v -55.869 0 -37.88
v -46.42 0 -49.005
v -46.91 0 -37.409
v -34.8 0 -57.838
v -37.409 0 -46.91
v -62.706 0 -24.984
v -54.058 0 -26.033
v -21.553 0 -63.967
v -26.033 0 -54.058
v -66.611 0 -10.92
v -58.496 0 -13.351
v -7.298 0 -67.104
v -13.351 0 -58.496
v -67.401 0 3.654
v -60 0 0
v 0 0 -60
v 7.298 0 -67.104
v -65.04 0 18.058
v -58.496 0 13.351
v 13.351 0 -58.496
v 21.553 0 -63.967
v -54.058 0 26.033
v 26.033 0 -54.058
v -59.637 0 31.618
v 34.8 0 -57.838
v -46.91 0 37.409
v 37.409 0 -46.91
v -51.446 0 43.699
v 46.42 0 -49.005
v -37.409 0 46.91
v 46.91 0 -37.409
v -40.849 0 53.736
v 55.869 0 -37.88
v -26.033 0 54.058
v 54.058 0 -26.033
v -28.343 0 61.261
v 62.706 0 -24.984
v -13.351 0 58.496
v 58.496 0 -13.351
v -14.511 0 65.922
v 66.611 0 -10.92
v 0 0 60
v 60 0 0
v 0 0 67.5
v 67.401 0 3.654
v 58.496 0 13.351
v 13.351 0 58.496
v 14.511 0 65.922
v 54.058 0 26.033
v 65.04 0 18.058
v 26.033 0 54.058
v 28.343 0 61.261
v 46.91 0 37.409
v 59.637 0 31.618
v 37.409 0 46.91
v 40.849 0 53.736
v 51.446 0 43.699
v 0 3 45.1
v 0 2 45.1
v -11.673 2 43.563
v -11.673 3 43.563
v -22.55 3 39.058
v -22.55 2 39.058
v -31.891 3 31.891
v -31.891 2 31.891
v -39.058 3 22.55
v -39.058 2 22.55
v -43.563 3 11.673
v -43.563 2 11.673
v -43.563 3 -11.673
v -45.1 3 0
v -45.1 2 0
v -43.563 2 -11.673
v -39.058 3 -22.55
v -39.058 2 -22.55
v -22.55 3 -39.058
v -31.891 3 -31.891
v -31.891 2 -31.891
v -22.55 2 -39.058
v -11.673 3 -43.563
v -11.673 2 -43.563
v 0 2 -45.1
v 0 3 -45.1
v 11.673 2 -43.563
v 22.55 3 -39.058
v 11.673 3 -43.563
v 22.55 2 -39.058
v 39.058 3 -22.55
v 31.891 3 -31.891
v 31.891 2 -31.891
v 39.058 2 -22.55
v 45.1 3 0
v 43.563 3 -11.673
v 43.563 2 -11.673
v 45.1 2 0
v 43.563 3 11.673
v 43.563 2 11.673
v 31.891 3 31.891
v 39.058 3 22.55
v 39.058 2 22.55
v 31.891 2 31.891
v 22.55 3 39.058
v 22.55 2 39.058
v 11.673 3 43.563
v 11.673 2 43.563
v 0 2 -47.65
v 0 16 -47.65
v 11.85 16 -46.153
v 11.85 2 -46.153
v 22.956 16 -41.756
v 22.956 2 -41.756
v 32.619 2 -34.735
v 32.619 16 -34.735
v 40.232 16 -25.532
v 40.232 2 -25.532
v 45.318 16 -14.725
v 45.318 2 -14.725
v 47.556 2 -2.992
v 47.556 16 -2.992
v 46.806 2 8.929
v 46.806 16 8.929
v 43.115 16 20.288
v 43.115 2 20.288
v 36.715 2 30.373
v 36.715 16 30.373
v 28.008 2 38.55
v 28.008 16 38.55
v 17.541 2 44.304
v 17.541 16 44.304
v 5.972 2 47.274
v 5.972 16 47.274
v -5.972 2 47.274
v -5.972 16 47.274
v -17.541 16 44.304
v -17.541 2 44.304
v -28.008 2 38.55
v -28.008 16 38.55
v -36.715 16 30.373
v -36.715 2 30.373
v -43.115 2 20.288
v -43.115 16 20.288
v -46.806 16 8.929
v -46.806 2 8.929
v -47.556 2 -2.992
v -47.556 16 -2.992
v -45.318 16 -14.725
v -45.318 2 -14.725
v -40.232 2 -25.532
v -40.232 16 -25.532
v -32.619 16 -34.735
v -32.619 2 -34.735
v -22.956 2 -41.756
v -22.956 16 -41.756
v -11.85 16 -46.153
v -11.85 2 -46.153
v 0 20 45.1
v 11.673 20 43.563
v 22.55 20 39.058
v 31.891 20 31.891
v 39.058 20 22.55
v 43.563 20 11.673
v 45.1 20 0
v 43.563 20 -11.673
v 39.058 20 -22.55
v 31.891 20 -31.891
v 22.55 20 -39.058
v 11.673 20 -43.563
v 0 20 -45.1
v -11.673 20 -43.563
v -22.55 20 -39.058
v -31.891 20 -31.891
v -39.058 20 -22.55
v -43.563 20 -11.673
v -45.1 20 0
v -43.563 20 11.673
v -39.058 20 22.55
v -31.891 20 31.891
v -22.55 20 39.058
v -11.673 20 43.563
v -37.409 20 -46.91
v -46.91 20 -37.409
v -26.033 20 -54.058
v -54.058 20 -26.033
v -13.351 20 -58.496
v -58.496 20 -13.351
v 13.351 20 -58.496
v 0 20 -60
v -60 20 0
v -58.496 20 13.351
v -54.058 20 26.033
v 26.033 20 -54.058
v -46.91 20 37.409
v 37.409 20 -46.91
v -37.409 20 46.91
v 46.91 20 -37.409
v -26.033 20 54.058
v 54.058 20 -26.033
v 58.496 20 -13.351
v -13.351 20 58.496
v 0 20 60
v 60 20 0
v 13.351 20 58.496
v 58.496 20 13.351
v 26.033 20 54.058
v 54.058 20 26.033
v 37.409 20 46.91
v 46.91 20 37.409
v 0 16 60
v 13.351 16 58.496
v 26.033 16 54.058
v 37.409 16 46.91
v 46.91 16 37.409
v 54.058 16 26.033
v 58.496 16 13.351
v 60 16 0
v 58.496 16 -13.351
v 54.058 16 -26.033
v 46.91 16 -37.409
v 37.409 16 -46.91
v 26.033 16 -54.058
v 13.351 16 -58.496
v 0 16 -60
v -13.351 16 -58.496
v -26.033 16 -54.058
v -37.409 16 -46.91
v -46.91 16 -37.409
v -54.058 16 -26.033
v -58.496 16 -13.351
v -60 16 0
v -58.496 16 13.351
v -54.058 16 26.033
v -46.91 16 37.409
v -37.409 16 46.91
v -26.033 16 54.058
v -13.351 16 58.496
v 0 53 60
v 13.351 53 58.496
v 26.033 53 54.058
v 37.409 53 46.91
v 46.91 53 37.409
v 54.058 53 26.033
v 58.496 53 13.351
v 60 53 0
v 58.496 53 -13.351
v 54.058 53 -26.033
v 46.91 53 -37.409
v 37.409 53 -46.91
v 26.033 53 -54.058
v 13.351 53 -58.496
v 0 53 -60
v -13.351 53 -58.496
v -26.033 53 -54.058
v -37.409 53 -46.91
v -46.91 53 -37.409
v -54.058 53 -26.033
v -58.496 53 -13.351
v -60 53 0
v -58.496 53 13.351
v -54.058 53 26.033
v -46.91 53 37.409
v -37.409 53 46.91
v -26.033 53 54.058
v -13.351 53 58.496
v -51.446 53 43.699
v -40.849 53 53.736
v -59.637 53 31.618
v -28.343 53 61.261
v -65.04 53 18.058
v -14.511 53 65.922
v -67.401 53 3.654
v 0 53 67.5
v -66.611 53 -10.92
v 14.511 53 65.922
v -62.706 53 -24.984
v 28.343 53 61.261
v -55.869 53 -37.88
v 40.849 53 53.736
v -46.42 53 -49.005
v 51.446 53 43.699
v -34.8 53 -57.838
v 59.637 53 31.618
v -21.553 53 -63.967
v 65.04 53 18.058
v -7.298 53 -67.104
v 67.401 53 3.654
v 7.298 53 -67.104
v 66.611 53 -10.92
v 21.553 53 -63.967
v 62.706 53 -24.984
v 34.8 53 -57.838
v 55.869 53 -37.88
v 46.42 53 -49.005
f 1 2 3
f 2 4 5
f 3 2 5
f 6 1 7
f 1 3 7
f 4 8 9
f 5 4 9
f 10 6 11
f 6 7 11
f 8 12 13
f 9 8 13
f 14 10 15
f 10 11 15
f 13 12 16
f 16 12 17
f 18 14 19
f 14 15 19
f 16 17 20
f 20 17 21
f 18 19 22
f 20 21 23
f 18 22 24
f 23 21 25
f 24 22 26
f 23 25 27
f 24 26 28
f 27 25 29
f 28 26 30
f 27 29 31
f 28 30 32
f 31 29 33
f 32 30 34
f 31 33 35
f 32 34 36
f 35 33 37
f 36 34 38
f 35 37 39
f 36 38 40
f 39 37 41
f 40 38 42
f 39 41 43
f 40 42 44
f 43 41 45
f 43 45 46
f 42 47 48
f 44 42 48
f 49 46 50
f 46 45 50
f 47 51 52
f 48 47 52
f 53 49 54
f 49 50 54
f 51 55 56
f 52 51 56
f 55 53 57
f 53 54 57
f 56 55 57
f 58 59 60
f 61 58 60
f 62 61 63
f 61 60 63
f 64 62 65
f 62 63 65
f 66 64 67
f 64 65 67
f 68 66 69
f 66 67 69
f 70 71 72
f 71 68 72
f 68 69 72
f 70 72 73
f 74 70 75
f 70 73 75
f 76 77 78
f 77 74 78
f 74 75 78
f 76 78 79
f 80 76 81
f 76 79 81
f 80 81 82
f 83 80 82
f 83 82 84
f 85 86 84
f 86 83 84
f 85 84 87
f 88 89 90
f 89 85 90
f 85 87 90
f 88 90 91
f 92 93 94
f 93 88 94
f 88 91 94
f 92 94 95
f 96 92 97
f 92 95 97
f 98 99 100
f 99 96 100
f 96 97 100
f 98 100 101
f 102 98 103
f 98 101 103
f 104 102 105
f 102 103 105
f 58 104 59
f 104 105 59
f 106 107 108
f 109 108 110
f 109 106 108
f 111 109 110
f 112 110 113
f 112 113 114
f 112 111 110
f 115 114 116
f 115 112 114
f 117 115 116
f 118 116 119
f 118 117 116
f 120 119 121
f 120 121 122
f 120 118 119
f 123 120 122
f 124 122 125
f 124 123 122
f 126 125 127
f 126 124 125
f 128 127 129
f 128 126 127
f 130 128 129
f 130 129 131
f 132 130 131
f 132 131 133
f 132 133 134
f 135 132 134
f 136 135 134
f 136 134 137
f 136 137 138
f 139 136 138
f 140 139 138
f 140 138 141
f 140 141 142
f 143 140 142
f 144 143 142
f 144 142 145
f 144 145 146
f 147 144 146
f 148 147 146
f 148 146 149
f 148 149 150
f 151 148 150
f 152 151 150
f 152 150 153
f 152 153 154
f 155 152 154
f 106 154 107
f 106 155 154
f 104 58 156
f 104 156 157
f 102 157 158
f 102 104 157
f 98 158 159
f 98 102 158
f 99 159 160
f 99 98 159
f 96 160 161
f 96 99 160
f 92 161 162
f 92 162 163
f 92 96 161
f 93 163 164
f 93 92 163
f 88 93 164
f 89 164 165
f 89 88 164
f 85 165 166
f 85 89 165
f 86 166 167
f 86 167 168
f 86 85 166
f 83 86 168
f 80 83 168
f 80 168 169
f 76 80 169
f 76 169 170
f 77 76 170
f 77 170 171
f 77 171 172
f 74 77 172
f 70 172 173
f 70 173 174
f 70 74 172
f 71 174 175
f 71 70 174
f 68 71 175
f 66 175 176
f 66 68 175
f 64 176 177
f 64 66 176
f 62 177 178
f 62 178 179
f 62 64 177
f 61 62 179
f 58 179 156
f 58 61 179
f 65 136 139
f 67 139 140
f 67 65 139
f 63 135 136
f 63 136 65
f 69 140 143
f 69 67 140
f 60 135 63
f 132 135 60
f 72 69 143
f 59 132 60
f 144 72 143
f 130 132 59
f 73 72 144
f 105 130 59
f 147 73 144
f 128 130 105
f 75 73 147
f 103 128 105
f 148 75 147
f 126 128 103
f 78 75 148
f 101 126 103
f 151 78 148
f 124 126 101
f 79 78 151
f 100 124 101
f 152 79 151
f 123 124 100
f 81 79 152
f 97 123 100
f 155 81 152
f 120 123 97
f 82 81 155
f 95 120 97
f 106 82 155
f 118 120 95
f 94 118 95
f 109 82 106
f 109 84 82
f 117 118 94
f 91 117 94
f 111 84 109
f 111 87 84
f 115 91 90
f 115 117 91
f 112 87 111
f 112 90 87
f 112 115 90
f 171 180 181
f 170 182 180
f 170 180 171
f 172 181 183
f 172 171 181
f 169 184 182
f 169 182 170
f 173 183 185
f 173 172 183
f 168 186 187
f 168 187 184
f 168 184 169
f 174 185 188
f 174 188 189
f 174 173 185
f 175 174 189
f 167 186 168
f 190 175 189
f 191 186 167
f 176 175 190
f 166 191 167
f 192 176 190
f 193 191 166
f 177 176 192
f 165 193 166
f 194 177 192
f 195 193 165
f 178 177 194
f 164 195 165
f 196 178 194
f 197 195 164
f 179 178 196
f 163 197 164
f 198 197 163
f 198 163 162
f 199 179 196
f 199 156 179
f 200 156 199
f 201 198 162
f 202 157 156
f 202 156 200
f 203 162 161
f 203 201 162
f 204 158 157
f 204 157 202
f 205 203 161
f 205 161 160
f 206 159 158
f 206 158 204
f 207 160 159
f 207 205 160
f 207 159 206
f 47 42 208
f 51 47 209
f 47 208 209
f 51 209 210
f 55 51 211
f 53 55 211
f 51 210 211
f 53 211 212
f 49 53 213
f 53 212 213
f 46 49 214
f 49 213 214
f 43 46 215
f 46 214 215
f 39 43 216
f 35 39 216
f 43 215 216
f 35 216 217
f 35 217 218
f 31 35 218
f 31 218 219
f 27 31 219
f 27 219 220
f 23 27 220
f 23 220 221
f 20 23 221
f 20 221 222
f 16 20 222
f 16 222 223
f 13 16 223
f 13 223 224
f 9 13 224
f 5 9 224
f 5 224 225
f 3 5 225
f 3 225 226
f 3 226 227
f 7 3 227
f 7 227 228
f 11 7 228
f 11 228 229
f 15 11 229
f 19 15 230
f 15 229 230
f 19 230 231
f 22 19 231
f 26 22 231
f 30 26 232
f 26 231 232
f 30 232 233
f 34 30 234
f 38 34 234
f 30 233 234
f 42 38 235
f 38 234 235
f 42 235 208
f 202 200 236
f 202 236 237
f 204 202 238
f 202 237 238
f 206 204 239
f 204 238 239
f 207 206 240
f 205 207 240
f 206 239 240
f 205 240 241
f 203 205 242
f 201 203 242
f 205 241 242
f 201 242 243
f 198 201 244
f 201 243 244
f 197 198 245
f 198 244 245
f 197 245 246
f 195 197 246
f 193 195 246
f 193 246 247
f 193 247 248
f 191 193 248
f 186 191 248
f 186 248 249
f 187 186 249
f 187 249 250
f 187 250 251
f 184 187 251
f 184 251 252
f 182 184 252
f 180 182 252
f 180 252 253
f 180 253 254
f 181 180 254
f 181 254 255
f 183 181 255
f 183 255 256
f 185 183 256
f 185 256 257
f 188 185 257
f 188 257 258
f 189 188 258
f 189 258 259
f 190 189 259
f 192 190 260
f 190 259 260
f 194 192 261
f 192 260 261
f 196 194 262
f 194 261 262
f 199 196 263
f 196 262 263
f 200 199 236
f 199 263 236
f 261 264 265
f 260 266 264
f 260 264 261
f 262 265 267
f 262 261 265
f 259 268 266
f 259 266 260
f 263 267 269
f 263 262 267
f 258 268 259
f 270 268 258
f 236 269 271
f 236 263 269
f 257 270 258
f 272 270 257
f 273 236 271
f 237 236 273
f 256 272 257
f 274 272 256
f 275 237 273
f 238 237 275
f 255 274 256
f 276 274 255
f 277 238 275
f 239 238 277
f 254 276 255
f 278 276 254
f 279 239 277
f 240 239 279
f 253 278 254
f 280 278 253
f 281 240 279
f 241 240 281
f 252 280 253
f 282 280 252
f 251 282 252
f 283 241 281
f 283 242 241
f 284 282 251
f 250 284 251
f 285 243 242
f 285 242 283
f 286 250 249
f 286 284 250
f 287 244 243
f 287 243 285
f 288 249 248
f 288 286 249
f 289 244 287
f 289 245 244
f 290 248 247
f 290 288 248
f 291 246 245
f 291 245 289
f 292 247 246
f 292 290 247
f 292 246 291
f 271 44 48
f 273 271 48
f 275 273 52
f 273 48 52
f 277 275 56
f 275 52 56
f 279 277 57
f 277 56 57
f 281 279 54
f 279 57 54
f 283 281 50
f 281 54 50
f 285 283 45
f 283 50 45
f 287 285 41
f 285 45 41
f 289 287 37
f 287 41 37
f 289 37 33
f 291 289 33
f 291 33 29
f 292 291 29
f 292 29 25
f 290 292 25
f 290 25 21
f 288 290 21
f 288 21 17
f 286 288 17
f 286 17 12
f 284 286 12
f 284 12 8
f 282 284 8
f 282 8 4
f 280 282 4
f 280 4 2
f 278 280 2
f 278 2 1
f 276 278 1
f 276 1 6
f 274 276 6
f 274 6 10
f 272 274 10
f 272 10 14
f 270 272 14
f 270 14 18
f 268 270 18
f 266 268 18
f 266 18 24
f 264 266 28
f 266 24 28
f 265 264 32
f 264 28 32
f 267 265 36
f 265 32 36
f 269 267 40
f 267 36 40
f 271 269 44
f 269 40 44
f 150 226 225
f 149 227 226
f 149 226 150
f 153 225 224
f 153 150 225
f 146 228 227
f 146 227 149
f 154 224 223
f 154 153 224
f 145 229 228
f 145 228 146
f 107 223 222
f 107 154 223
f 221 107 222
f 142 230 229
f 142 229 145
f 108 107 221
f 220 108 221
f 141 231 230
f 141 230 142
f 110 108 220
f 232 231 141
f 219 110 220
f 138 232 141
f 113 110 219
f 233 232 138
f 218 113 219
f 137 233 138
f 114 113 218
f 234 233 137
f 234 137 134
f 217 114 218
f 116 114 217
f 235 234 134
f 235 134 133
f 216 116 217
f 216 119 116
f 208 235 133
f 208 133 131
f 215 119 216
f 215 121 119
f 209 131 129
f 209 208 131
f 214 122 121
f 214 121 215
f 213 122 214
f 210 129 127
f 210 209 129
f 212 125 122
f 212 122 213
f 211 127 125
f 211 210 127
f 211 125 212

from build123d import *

# Parameters (mm, degrees)
SKETCH1_R            = 75
SKETCH1_R_2          = 62.3
BOSS_EXTRUDE1_DEPTH  = 53
BOSS_EXTRUDE3_START  = 3
SKETCH3_R            = 75
SKETCH3_R_2          = 47
BOSS_EXTRUDE3_DEPTH  = 3
BOSS_EXTRUDE4_START  = 14
SKETCH4_R            = 50.1
SKETCH4_R_2          = 47
BOSS_EXTRUDE4_DEPTH  = 14
BOSS_EXTRUDE5_START  = 1
SKETCH5_R            = 62.3
SKETCH5_R_2          = 50.1
BOSS_EXTRUDE5_DEPTH  = 1
CUT_EXTRUDE2_START   = -64
SKETCH6_R            = 75
SKETCH6_R_2          = 67.5
CUT_EXTRUDE2_DEPTH   = 64
BOSS_EXTRUDE6_REACH  = 111.186
SKETCH7_R            = 62.3
SKETCH7_R_2          = 60
SKETCH9_R            = 50.1
SKETCH9_R_2          = 47
CUT_EXTRUDE3_DEPTH   = 17
BOSS_EXTRUDE7_START  = -4
SKETCH10_R           = 50.1
SKETCH10_R_2         = 48.5
BOSS_EXTRUDE7_DEPTH  = 4
SKETCH12_R           = 48.5
SKETCH12_R_2         = 47.6
BOSS_EXTRUDE8_DEPTH  = 4
BOSS_EXTRUDE9_START  = -17
SKETCH13_R           = 47.6
SKETCH13_R_2         = 45.1
BOSS_EXTRUDE9_DEPTH  = 17
SKETCH14_R           = 47.65
SKETCH14_R_2         = 47.6
BOSS_EXTRUDE10_DEPTH = 13
BOSS_EXTRUDE11_START = 1
SKETCH15_R           = 47.65
SKETCH15_R_2         = 45.1
BOSS_EXTRUDE11_DEPTH = 1


with BuildPart() as part:
    # Sketch1 → Boss-Extrude1 (new body)
    with BuildSketch(Plane(origin=(0, 0, 0), x_dir=(1, 0, 0), z_dir=(0, 1, 0))):
        with Locations(Location((0, 0, 0), (0, 0, 270))):
            Circle(SKETCH1_R)
        with Locations(Location((0, 0, 0), (0, 0, 270))):
            Circle(SKETCH1_R_2, mode=Mode.SUBTRACT)
    extrude(amount=BOSS_EXTRUDE1_DEPTH)

    # Sketch3 → Boss-Extrude3 (add)
    with BuildSketch(Plane(origin=(0, 20, 0), x_dir=(-1, 0, 0), z_dir=(0, -1, 0)).offset(BOSS_EXTRUDE3_START)):
        with Locations(Location((0, 0, 0), (0, 0, 270))):
            Circle(SKETCH3_R)
        with Locations(Location((0, 0, 0), (0, 0, 90))):
            Circle(SKETCH3_R_2, mode=Mode.SUBTRACT)
    extrude(amount=-BOSS_EXTRUDE3_DEPTH)

    # Sketch4 → Boss-Extrude4 (add)
    with BuildSketch(Plane.XZ.offset(-17).offset(BOSS_EXTRUDE4_START)):
        with Locations(Location((0, 0, 0), (0, 0, 270))):
            Circle(SKETCH4_R)
        with Locations(Location((0, 0, 0), (0, 0, 270))):
            Circle(SKETCH4_R_2, mode=Mode.SUBTRACT)
    extrude(amount=-BOSS_EXTRUDE4_DEPTH)

    # Sketch5 → Boss-Extrude5 (add)
    with BuildSketch(Plane.XZ.offset(-17).offset(BOSS_EXTRUDE5_START)):
        with Locations(Location((0, 0, 0), (0, 0, 270))):
            Circle(SKETCH5_R)
        with Locations(Location((0, 0, 0), (0, 0, 270))):
            Circle(SKETCH5_R_2, mode=Mode.SUBTRACT)
    extrude(amount=-BOSS_EXTRUDE5_DEPTH)

    # Sketch6 → Cut-Extrude2 (cut)
    with BuildSketch(Plane(origin=(0, 53, 0), x_dir=(1, 0, 0), z_dir=(0, 1, 0)).offset(CUT_EXTRUDE2_START)):
        Circle(SKETCH6_R)
        with Locations(Location((0, 0, 0), (0, 0, 270))):
            Circle(SKETCH6_R_2, mode=Mode.SUBTRACT)
    extrude(amount=CUT_EXTRUDE2_DEPTH, mode=Mode.SUBTRACT)

    # Boss-Extrude6: up to this face of the body (flat: up to its plane)
    boss_extrude6_end = Plane(part.part.faces().sort_by_distance((0, 0, -65.590811691))[0])
    # Sketch7 → Boss-Extrude6 (add, up to the picked face)
    with BuildSketch(Plane(origin=(0, 53, 0), x_dir=(1, 0, 0), z_dir=(0, 1, 0)), mode=Mode.PRIVATE) as boss_extrude6_sk1:
        Circle(SKETCH7_R)
        with Locations(Location((0, 0, 0), (0, 0, 270))):
            Circle(SKETCH7_R_2, mode=Mode.SUBTRACT)
    boss_extrude6_tool1 = split(extrude(boss_extrude6_sk1.sketch, amount=-BOSS_EXTRUDE6_REACH, mode=Mode.PRIVATE), bisect_by=boss_extrude6_end, keep=Keep.BOTH, mode=Mode.PRIVATE)
    add(boss_extrude6_tool1.solids().sort_by(Axis((-60.53789, 53, 0), (0, -1, 0)))[0])

    # Sketch9 → Cut-Extrude3 (cut)
    with BuildSketch(Plane.XZ.offset(-3)):
        with Locations(Location((0, 0, 0), (0, 0, 270))):
            Circle(SKETCH9_R)
        Circle(SKETCH9_R_2, mode=Mode.SUBTRACT)
    extrude(amount=-CUT_EXTRUDE3_DEPTH, mode=Mode.SUBTRACT)

    # Sketch10 → Boss-Extrude7 (add)
    with BuildSketch(Plane(origin=(0, 20, 0), x_dir=(1, 0, 0), z_dir=(0, 1, 0)).offset(BOSS_EXTRUDE7_START)):
        Circle(SKETCH10_R)
        with Locations(Location((0, 0, 0), (0, 0, 270))):
            Circle(SKETCH10_R_2, mode=Mode.SUBTRACT)
    extrude(amount=BOSS_EXTRUDE7_DEPTH)

    # Sketch12 → Boss-Extrude8 (add)
    with BuildSketch(Plane.XZ.offset(-16)):
        Circle(SKETCH12_R)
        with Locations(Location((0, 0, 0), (0, 0, 270))):
            Circle(SKETCH12_R_2, mode=Mode.SUBTRACT)
    extrude(amount=-BOSS_EXTRUDE8_DEPTH)

    # Sketch13 → Boss-Extrude9 (add)
    with BuildSketch(Plane(origin=(0, 20, 0), x_dir=(1, 0, 0), z_dir=(0, 1, 0)).offset(BOSS_EXTRUDE9_START)):
        with Locations(Location((0, 0, 0), (0, 0, 270))):
            Circle(SKETCH13_R)
        with Locations(Location((0, 0, 0), (0, 0, 270))):
            Circle(SKETCH13_R_2, mode=Mode.SUBTRACT)
    extrude(amount=BOSS_EXTRUDE9_DEPTH)

    # Sketch14 → Boss-Extrude10 (add)
    with BuildSketch(Plane.XZ.offset(-3)):
        with Locations(Location((0, 0, 0), (0, 0, 270))):
            Circle(SKETCH14_R)
        Circle(SKETCH14_R_2, mode=Mode.SUBTRACT)
    extrude(amount=-BOSS_EXTRUDE10_DEPTH)

    # Sketch15 → Boss-Extrude11 (add)
    with BuildSketch(Plane.XZ.offset(-3).offset(BOSS_EXTRUDE11_START)):
        with Locations(Location((0, 0, 0), (0, 0, 270))):
            Circle(SKETCH15_R)
        with Locations(Location((0, 0, 0), (0, 0, 90))):
            Circle(SKETCH15_R_2, mode=Mode.SUBTRACT)
    extrude(amount=-BOSS_EXTRUDE11_DEPTH)


solid = part.part
